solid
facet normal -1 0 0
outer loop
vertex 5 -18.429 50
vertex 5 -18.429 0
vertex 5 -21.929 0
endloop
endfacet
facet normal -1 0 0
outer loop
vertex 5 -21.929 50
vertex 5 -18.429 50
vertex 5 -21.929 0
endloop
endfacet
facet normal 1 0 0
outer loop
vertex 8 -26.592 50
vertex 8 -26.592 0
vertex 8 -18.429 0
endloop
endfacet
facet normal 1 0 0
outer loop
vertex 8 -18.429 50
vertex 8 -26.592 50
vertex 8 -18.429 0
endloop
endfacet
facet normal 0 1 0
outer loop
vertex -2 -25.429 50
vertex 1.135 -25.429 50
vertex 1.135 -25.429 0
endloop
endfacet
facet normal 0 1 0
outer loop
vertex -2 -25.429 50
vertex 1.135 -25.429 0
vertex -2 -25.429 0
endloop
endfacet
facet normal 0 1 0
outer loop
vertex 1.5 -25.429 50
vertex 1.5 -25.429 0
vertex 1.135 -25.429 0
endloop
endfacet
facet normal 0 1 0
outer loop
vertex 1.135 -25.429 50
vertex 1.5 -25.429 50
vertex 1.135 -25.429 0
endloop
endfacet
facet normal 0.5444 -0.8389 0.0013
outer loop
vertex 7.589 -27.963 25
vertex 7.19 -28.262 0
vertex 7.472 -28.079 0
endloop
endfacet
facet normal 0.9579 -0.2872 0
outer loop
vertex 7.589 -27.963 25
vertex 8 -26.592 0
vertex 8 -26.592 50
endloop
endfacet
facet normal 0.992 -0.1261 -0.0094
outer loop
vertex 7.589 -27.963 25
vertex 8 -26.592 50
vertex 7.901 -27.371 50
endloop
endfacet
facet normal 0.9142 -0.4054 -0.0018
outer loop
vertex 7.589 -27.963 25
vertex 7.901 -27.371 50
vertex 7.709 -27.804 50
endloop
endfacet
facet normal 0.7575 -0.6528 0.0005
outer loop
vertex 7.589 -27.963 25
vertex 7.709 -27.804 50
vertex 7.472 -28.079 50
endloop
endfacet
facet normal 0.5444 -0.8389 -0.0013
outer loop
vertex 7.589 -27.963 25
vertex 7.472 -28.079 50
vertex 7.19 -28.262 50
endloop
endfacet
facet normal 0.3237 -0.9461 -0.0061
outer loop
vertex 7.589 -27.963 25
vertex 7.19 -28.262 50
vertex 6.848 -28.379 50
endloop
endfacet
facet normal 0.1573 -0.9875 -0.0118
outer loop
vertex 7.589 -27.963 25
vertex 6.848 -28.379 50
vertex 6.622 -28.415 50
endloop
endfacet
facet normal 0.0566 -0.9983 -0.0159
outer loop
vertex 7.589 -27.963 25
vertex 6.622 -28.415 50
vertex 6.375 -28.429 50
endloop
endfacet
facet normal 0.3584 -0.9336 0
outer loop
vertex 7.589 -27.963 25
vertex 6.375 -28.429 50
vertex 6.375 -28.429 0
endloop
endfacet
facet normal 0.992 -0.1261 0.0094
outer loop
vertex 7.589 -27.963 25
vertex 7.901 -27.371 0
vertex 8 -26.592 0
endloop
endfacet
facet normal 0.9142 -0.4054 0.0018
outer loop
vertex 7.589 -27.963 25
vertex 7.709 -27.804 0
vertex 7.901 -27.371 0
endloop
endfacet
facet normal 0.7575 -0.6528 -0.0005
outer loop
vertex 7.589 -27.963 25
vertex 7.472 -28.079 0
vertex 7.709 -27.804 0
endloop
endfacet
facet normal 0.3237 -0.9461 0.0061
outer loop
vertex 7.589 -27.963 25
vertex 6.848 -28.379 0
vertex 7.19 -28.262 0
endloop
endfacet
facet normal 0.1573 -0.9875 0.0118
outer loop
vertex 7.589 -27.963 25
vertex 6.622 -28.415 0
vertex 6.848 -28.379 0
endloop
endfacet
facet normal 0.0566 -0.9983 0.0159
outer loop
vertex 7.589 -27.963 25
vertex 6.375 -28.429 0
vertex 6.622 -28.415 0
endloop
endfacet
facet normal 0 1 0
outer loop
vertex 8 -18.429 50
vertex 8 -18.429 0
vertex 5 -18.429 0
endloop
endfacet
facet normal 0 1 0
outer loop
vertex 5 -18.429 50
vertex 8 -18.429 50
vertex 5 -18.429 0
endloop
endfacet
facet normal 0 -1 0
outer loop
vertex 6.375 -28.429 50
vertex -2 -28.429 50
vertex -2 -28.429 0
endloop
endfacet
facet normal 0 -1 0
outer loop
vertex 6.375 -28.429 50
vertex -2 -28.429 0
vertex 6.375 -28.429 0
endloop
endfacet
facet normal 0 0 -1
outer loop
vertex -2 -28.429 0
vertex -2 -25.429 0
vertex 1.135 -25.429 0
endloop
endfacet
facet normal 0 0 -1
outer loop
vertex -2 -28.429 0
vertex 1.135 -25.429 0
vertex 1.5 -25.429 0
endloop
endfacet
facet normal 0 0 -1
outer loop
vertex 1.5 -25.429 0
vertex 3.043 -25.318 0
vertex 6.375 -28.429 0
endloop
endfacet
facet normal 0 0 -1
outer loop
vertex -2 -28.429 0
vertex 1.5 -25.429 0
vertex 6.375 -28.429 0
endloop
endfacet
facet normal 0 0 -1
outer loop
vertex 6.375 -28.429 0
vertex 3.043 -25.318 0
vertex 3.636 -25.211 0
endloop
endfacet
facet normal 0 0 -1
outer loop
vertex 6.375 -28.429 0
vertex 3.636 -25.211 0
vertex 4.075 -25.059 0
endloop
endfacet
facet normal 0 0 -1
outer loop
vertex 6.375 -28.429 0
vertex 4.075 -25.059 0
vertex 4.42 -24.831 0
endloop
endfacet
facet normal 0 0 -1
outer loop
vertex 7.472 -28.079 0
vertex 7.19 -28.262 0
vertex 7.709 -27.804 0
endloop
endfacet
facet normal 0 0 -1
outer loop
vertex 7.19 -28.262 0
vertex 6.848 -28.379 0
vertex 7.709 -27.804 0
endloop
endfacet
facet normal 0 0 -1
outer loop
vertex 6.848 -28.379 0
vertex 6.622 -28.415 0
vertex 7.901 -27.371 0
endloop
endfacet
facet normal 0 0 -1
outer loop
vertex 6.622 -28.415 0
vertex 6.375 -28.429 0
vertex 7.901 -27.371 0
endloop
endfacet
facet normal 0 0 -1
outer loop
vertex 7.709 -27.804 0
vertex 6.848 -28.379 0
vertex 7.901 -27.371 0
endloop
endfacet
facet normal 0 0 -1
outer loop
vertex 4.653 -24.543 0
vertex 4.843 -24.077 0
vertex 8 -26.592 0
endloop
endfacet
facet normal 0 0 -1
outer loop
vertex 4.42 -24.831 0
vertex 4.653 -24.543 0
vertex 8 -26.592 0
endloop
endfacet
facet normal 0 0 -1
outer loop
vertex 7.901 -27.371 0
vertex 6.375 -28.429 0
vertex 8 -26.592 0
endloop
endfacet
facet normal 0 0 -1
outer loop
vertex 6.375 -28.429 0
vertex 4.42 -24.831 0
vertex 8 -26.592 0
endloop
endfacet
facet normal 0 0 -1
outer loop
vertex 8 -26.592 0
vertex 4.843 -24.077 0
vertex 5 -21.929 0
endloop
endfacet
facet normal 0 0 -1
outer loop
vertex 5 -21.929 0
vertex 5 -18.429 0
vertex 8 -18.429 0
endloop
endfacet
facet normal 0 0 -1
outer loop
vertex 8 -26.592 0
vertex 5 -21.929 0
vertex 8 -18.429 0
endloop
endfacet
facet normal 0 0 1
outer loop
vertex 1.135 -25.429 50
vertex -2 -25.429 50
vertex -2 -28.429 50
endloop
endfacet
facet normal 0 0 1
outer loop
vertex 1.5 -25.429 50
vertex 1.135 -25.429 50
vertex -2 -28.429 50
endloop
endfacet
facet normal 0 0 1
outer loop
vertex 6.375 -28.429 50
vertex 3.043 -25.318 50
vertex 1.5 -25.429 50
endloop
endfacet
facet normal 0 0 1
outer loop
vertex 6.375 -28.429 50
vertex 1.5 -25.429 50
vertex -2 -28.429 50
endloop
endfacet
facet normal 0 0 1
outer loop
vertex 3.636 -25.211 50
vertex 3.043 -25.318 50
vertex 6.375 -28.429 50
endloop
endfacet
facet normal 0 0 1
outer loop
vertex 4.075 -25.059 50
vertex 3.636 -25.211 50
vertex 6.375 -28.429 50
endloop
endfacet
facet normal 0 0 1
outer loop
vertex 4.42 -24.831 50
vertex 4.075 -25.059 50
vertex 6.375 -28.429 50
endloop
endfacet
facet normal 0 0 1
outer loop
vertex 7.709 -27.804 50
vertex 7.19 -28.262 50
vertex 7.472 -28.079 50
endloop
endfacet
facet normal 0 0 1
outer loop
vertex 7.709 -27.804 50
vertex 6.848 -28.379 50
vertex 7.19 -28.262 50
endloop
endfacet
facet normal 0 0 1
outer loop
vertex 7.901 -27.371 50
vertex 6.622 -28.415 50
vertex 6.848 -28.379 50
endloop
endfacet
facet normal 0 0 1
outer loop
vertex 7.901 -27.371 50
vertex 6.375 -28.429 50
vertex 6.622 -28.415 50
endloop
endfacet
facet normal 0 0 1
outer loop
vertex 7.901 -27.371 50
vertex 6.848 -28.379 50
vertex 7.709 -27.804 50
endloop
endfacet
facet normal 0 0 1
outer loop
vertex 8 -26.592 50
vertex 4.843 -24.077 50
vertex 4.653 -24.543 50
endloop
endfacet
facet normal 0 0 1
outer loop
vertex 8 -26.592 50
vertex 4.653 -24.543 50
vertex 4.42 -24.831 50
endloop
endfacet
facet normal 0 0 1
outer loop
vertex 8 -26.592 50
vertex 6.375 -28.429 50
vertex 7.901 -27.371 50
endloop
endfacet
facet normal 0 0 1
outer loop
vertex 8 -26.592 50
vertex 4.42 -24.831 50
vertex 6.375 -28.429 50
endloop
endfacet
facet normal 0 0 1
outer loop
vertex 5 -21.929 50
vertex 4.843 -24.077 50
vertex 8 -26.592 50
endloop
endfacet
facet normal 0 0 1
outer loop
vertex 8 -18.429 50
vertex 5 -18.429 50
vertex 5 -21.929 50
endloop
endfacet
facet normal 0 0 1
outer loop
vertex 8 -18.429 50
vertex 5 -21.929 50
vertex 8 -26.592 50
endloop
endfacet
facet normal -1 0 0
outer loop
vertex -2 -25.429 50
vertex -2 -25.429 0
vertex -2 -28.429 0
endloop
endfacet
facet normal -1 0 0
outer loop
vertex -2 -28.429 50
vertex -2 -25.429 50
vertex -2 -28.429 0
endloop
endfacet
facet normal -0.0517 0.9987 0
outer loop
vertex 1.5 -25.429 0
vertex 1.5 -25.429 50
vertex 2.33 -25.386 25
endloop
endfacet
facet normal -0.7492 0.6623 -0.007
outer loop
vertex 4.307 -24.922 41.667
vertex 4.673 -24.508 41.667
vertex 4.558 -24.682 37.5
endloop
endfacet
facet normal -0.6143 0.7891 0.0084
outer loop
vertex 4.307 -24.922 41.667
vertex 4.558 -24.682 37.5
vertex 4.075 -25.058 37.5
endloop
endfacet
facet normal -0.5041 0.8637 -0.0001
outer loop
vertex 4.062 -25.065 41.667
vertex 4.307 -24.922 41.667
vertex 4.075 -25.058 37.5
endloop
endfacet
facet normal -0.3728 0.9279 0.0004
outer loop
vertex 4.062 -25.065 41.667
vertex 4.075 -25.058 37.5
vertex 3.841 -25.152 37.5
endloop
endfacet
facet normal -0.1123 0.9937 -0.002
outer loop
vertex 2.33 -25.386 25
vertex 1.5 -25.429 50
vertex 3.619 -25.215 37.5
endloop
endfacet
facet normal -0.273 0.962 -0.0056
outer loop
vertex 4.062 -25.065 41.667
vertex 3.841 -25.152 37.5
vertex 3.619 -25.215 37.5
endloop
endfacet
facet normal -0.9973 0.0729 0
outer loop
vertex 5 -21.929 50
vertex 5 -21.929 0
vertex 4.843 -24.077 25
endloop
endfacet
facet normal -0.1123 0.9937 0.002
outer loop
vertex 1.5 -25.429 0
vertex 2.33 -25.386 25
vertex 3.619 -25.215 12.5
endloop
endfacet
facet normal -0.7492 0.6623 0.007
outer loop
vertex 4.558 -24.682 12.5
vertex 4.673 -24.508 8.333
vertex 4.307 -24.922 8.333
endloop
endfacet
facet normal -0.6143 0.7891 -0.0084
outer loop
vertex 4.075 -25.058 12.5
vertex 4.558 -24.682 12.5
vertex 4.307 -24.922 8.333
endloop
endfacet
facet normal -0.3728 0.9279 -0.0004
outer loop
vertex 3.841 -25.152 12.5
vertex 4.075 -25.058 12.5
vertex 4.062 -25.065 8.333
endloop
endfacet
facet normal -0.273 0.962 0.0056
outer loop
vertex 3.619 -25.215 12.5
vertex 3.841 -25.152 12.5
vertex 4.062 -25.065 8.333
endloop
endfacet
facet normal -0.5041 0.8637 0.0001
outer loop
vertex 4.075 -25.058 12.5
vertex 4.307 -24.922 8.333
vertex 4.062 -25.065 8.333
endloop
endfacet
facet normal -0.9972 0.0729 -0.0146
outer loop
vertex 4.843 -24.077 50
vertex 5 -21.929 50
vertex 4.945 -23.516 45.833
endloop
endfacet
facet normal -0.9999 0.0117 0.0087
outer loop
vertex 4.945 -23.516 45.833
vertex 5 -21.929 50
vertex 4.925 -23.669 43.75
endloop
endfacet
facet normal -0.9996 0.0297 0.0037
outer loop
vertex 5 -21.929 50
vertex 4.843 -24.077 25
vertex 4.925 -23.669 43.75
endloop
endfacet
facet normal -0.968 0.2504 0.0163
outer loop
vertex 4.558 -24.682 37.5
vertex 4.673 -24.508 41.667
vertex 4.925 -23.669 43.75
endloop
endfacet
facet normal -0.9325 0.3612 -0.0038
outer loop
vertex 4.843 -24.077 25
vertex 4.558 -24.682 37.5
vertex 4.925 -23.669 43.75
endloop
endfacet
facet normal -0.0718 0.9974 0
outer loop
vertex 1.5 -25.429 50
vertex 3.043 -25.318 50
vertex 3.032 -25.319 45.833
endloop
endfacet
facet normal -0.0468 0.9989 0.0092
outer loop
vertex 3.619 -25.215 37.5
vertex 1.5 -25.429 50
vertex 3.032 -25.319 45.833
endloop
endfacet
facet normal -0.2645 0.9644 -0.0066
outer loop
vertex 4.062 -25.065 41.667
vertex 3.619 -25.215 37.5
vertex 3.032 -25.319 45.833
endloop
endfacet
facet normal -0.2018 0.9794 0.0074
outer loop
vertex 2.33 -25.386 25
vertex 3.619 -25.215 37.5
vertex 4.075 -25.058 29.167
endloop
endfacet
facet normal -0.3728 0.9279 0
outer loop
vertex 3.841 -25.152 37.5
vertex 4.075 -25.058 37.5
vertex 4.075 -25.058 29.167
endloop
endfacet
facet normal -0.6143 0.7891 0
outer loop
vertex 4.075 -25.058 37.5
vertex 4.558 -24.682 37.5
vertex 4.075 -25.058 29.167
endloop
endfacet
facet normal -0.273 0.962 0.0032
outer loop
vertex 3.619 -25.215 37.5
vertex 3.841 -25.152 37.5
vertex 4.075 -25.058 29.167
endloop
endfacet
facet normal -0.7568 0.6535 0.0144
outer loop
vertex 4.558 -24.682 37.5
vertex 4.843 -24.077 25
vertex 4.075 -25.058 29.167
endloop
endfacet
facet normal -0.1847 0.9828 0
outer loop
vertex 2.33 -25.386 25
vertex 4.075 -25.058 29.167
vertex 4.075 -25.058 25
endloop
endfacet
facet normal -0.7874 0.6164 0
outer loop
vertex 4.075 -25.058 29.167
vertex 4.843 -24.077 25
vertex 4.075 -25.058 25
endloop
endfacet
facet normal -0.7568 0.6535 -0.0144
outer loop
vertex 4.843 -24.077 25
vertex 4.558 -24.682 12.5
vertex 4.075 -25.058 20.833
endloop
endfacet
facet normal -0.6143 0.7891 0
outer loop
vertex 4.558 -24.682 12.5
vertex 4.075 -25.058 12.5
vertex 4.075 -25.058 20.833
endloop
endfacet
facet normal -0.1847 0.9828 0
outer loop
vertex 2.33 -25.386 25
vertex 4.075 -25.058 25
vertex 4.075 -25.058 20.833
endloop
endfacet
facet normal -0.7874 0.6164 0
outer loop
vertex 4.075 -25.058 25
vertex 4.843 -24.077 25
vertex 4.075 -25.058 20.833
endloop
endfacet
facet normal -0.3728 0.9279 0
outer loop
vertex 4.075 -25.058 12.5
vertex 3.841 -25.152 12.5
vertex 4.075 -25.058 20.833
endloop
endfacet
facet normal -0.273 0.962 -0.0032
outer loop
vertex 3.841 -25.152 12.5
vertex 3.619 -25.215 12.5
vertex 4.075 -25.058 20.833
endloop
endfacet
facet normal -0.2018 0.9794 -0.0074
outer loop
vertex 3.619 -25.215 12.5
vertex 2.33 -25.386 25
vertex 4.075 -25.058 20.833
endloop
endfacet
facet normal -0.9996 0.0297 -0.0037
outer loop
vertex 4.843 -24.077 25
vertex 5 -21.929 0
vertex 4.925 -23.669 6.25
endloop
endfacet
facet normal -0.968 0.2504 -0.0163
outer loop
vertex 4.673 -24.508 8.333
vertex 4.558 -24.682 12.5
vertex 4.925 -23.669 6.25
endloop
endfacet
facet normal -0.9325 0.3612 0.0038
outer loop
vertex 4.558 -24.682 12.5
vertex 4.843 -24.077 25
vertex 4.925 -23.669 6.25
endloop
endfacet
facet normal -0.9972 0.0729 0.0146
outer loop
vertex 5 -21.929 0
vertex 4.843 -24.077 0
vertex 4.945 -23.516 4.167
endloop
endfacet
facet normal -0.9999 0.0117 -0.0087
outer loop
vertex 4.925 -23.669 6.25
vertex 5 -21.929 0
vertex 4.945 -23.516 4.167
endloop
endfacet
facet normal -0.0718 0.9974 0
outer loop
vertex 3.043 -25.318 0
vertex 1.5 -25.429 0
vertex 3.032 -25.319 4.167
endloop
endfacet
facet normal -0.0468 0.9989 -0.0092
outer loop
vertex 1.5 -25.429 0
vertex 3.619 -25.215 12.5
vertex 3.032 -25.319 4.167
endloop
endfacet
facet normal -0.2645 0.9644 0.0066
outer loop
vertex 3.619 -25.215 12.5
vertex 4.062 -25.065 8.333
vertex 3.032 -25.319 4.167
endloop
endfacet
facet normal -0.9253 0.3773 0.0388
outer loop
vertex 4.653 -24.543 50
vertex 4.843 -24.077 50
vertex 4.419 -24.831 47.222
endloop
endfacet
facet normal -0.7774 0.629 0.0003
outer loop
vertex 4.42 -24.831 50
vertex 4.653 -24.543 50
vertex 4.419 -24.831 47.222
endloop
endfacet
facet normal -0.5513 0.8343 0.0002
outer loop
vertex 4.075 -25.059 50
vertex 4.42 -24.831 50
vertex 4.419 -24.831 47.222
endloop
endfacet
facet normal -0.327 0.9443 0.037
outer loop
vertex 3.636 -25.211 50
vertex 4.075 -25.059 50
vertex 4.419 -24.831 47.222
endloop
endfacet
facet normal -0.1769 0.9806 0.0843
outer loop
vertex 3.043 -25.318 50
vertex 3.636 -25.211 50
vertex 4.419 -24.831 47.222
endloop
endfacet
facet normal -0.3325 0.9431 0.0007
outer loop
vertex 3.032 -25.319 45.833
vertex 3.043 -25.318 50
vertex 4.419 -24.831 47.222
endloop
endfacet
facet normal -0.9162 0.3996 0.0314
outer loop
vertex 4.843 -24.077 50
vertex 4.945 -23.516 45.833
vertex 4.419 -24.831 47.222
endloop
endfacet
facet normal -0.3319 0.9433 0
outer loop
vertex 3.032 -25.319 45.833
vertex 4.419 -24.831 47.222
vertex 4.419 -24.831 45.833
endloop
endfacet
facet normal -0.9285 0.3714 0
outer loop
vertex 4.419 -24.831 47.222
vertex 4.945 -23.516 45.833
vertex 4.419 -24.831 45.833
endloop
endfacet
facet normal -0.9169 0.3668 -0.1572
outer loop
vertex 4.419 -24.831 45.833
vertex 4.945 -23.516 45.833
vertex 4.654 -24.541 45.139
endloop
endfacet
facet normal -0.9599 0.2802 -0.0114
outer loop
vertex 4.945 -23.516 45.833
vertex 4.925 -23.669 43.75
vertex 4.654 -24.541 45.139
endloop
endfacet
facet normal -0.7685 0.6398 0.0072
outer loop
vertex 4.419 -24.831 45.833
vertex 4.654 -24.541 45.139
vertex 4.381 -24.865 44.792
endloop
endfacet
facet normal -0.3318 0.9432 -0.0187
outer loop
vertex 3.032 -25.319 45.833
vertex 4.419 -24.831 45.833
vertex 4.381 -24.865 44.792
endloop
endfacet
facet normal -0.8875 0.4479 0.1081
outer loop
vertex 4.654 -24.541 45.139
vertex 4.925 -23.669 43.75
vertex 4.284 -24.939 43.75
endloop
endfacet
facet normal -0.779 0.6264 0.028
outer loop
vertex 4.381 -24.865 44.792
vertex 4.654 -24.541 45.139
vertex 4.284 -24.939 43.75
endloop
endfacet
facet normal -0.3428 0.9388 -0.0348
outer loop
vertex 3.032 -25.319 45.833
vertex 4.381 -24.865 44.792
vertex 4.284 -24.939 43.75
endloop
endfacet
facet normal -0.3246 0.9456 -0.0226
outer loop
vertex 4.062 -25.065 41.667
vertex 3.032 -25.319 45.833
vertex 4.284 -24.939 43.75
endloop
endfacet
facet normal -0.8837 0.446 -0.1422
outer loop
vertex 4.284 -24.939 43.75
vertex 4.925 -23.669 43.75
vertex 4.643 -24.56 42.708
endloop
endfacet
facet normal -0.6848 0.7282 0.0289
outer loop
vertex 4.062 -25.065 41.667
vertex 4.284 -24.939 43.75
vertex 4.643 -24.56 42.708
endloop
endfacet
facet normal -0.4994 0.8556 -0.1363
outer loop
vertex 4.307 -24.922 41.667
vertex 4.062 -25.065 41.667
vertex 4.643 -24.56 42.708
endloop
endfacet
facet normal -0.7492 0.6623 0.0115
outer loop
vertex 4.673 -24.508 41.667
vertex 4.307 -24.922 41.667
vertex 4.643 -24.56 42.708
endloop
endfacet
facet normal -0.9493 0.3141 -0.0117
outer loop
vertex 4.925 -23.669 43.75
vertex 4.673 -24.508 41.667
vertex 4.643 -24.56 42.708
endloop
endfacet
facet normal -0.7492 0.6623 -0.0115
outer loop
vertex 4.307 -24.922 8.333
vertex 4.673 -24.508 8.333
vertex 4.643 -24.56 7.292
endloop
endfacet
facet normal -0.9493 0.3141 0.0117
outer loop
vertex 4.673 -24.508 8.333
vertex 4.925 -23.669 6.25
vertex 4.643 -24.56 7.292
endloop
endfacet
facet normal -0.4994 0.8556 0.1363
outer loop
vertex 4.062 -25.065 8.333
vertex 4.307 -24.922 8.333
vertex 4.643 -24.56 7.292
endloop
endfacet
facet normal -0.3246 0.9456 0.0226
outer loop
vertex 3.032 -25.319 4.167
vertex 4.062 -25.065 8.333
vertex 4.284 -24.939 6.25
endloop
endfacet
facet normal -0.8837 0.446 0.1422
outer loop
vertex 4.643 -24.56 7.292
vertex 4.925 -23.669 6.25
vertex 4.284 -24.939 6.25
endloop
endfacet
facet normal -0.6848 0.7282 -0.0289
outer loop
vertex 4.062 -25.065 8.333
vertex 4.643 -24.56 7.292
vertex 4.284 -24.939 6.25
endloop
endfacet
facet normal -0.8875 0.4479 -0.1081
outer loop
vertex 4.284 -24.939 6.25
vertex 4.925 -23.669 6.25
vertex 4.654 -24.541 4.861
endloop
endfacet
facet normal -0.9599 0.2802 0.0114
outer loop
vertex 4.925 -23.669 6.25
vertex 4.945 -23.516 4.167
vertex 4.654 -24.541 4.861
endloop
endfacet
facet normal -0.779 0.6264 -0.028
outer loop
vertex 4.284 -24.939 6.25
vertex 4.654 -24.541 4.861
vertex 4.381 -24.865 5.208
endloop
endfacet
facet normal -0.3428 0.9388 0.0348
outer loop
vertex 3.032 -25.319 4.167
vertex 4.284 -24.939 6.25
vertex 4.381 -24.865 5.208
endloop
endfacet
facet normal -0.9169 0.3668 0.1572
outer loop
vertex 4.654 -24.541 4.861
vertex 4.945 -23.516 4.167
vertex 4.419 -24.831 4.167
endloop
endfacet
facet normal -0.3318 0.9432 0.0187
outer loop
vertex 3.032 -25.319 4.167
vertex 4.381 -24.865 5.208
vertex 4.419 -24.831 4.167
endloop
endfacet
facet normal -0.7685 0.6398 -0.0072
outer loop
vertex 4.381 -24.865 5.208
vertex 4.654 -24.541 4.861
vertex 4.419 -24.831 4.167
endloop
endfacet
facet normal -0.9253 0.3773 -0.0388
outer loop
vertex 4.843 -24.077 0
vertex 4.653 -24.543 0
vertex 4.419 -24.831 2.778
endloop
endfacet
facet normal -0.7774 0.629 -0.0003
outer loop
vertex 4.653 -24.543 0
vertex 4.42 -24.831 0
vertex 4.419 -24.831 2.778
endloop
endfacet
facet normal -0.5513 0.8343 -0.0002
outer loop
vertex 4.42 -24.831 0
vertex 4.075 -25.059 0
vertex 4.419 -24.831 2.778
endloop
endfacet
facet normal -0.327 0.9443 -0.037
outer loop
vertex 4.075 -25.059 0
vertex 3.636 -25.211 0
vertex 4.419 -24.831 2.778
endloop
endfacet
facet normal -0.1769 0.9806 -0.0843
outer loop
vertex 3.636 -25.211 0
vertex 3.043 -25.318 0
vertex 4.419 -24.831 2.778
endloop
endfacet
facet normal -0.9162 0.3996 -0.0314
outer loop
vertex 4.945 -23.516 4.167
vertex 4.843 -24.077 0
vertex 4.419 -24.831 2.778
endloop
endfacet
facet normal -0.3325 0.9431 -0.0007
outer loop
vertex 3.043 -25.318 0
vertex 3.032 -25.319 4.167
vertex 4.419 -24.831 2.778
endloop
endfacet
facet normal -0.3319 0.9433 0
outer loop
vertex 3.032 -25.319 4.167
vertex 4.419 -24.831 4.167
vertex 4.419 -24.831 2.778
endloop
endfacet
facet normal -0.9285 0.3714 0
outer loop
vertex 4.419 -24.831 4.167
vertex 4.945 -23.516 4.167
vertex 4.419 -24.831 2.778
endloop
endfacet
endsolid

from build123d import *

# Parameters (mm, degrees)
BOSS_EXTRUDE1_DEPTH = 50


with BuildPart() as part:
    # Sketch1 → Boss-Extrude1 (new body)
    with BuildSketch(Plane.XY):
        with BuildLine():
            Line((8, -26.551688605), (8, -18.428571429))
            Line((8, -18.428571429), (5, -18.428571429))
            Line((5, -18.428571429), (5, -21.928571429))
            add(Edge.make_bspline(
                [(5, -21.928571429), (5.024758601, -24.831978652), (4.649789686, -25.256197355), (1.780732191, -25.422029081), (1.5, -25.428571429)],
                knots=[0, 0, 0, 0, 0.274480378, 0.304978198, 0.304978198, 0.304978198, 0.304978198], degree=3))
            add(Edge.make_bspline(
                [(1.5, -25.428571429), (1.487835227, -25.428854924), (1.366303422, -25.431501338), (1.24618398, -25.432201725), (1.135408239, -25.428571429)],
                knots=[0.304978198, 0.304978198, 0.304978198, 0.304978198, 0.306299739, 0.318193606, 0.318193606, 0.318193606, 0.318193606], degree=3))
            Line((1.135408239, -25.428571429), (-2, -25.428571429))
            Line((-2, -25.428571429), (-2, -28.428571429))
            Line((-2, -28.428571429), (6.375219325, -28.428571429))
            add(Edge.make_bspline(
                [(8.000000018, -26.592463548), (7.991060741, -28.414640159), (6.375219325, -28.428571429)],
                knots=[0.011004644, 0.011004644, 0.011004644, 1, 1, 1], degree=2))
            Line((8, -26.592463548), (8, -26.551688605))
        make_face()
    extrude(amount=BOSS_EXTRUDE1_DEPTH)


solid = part.part
